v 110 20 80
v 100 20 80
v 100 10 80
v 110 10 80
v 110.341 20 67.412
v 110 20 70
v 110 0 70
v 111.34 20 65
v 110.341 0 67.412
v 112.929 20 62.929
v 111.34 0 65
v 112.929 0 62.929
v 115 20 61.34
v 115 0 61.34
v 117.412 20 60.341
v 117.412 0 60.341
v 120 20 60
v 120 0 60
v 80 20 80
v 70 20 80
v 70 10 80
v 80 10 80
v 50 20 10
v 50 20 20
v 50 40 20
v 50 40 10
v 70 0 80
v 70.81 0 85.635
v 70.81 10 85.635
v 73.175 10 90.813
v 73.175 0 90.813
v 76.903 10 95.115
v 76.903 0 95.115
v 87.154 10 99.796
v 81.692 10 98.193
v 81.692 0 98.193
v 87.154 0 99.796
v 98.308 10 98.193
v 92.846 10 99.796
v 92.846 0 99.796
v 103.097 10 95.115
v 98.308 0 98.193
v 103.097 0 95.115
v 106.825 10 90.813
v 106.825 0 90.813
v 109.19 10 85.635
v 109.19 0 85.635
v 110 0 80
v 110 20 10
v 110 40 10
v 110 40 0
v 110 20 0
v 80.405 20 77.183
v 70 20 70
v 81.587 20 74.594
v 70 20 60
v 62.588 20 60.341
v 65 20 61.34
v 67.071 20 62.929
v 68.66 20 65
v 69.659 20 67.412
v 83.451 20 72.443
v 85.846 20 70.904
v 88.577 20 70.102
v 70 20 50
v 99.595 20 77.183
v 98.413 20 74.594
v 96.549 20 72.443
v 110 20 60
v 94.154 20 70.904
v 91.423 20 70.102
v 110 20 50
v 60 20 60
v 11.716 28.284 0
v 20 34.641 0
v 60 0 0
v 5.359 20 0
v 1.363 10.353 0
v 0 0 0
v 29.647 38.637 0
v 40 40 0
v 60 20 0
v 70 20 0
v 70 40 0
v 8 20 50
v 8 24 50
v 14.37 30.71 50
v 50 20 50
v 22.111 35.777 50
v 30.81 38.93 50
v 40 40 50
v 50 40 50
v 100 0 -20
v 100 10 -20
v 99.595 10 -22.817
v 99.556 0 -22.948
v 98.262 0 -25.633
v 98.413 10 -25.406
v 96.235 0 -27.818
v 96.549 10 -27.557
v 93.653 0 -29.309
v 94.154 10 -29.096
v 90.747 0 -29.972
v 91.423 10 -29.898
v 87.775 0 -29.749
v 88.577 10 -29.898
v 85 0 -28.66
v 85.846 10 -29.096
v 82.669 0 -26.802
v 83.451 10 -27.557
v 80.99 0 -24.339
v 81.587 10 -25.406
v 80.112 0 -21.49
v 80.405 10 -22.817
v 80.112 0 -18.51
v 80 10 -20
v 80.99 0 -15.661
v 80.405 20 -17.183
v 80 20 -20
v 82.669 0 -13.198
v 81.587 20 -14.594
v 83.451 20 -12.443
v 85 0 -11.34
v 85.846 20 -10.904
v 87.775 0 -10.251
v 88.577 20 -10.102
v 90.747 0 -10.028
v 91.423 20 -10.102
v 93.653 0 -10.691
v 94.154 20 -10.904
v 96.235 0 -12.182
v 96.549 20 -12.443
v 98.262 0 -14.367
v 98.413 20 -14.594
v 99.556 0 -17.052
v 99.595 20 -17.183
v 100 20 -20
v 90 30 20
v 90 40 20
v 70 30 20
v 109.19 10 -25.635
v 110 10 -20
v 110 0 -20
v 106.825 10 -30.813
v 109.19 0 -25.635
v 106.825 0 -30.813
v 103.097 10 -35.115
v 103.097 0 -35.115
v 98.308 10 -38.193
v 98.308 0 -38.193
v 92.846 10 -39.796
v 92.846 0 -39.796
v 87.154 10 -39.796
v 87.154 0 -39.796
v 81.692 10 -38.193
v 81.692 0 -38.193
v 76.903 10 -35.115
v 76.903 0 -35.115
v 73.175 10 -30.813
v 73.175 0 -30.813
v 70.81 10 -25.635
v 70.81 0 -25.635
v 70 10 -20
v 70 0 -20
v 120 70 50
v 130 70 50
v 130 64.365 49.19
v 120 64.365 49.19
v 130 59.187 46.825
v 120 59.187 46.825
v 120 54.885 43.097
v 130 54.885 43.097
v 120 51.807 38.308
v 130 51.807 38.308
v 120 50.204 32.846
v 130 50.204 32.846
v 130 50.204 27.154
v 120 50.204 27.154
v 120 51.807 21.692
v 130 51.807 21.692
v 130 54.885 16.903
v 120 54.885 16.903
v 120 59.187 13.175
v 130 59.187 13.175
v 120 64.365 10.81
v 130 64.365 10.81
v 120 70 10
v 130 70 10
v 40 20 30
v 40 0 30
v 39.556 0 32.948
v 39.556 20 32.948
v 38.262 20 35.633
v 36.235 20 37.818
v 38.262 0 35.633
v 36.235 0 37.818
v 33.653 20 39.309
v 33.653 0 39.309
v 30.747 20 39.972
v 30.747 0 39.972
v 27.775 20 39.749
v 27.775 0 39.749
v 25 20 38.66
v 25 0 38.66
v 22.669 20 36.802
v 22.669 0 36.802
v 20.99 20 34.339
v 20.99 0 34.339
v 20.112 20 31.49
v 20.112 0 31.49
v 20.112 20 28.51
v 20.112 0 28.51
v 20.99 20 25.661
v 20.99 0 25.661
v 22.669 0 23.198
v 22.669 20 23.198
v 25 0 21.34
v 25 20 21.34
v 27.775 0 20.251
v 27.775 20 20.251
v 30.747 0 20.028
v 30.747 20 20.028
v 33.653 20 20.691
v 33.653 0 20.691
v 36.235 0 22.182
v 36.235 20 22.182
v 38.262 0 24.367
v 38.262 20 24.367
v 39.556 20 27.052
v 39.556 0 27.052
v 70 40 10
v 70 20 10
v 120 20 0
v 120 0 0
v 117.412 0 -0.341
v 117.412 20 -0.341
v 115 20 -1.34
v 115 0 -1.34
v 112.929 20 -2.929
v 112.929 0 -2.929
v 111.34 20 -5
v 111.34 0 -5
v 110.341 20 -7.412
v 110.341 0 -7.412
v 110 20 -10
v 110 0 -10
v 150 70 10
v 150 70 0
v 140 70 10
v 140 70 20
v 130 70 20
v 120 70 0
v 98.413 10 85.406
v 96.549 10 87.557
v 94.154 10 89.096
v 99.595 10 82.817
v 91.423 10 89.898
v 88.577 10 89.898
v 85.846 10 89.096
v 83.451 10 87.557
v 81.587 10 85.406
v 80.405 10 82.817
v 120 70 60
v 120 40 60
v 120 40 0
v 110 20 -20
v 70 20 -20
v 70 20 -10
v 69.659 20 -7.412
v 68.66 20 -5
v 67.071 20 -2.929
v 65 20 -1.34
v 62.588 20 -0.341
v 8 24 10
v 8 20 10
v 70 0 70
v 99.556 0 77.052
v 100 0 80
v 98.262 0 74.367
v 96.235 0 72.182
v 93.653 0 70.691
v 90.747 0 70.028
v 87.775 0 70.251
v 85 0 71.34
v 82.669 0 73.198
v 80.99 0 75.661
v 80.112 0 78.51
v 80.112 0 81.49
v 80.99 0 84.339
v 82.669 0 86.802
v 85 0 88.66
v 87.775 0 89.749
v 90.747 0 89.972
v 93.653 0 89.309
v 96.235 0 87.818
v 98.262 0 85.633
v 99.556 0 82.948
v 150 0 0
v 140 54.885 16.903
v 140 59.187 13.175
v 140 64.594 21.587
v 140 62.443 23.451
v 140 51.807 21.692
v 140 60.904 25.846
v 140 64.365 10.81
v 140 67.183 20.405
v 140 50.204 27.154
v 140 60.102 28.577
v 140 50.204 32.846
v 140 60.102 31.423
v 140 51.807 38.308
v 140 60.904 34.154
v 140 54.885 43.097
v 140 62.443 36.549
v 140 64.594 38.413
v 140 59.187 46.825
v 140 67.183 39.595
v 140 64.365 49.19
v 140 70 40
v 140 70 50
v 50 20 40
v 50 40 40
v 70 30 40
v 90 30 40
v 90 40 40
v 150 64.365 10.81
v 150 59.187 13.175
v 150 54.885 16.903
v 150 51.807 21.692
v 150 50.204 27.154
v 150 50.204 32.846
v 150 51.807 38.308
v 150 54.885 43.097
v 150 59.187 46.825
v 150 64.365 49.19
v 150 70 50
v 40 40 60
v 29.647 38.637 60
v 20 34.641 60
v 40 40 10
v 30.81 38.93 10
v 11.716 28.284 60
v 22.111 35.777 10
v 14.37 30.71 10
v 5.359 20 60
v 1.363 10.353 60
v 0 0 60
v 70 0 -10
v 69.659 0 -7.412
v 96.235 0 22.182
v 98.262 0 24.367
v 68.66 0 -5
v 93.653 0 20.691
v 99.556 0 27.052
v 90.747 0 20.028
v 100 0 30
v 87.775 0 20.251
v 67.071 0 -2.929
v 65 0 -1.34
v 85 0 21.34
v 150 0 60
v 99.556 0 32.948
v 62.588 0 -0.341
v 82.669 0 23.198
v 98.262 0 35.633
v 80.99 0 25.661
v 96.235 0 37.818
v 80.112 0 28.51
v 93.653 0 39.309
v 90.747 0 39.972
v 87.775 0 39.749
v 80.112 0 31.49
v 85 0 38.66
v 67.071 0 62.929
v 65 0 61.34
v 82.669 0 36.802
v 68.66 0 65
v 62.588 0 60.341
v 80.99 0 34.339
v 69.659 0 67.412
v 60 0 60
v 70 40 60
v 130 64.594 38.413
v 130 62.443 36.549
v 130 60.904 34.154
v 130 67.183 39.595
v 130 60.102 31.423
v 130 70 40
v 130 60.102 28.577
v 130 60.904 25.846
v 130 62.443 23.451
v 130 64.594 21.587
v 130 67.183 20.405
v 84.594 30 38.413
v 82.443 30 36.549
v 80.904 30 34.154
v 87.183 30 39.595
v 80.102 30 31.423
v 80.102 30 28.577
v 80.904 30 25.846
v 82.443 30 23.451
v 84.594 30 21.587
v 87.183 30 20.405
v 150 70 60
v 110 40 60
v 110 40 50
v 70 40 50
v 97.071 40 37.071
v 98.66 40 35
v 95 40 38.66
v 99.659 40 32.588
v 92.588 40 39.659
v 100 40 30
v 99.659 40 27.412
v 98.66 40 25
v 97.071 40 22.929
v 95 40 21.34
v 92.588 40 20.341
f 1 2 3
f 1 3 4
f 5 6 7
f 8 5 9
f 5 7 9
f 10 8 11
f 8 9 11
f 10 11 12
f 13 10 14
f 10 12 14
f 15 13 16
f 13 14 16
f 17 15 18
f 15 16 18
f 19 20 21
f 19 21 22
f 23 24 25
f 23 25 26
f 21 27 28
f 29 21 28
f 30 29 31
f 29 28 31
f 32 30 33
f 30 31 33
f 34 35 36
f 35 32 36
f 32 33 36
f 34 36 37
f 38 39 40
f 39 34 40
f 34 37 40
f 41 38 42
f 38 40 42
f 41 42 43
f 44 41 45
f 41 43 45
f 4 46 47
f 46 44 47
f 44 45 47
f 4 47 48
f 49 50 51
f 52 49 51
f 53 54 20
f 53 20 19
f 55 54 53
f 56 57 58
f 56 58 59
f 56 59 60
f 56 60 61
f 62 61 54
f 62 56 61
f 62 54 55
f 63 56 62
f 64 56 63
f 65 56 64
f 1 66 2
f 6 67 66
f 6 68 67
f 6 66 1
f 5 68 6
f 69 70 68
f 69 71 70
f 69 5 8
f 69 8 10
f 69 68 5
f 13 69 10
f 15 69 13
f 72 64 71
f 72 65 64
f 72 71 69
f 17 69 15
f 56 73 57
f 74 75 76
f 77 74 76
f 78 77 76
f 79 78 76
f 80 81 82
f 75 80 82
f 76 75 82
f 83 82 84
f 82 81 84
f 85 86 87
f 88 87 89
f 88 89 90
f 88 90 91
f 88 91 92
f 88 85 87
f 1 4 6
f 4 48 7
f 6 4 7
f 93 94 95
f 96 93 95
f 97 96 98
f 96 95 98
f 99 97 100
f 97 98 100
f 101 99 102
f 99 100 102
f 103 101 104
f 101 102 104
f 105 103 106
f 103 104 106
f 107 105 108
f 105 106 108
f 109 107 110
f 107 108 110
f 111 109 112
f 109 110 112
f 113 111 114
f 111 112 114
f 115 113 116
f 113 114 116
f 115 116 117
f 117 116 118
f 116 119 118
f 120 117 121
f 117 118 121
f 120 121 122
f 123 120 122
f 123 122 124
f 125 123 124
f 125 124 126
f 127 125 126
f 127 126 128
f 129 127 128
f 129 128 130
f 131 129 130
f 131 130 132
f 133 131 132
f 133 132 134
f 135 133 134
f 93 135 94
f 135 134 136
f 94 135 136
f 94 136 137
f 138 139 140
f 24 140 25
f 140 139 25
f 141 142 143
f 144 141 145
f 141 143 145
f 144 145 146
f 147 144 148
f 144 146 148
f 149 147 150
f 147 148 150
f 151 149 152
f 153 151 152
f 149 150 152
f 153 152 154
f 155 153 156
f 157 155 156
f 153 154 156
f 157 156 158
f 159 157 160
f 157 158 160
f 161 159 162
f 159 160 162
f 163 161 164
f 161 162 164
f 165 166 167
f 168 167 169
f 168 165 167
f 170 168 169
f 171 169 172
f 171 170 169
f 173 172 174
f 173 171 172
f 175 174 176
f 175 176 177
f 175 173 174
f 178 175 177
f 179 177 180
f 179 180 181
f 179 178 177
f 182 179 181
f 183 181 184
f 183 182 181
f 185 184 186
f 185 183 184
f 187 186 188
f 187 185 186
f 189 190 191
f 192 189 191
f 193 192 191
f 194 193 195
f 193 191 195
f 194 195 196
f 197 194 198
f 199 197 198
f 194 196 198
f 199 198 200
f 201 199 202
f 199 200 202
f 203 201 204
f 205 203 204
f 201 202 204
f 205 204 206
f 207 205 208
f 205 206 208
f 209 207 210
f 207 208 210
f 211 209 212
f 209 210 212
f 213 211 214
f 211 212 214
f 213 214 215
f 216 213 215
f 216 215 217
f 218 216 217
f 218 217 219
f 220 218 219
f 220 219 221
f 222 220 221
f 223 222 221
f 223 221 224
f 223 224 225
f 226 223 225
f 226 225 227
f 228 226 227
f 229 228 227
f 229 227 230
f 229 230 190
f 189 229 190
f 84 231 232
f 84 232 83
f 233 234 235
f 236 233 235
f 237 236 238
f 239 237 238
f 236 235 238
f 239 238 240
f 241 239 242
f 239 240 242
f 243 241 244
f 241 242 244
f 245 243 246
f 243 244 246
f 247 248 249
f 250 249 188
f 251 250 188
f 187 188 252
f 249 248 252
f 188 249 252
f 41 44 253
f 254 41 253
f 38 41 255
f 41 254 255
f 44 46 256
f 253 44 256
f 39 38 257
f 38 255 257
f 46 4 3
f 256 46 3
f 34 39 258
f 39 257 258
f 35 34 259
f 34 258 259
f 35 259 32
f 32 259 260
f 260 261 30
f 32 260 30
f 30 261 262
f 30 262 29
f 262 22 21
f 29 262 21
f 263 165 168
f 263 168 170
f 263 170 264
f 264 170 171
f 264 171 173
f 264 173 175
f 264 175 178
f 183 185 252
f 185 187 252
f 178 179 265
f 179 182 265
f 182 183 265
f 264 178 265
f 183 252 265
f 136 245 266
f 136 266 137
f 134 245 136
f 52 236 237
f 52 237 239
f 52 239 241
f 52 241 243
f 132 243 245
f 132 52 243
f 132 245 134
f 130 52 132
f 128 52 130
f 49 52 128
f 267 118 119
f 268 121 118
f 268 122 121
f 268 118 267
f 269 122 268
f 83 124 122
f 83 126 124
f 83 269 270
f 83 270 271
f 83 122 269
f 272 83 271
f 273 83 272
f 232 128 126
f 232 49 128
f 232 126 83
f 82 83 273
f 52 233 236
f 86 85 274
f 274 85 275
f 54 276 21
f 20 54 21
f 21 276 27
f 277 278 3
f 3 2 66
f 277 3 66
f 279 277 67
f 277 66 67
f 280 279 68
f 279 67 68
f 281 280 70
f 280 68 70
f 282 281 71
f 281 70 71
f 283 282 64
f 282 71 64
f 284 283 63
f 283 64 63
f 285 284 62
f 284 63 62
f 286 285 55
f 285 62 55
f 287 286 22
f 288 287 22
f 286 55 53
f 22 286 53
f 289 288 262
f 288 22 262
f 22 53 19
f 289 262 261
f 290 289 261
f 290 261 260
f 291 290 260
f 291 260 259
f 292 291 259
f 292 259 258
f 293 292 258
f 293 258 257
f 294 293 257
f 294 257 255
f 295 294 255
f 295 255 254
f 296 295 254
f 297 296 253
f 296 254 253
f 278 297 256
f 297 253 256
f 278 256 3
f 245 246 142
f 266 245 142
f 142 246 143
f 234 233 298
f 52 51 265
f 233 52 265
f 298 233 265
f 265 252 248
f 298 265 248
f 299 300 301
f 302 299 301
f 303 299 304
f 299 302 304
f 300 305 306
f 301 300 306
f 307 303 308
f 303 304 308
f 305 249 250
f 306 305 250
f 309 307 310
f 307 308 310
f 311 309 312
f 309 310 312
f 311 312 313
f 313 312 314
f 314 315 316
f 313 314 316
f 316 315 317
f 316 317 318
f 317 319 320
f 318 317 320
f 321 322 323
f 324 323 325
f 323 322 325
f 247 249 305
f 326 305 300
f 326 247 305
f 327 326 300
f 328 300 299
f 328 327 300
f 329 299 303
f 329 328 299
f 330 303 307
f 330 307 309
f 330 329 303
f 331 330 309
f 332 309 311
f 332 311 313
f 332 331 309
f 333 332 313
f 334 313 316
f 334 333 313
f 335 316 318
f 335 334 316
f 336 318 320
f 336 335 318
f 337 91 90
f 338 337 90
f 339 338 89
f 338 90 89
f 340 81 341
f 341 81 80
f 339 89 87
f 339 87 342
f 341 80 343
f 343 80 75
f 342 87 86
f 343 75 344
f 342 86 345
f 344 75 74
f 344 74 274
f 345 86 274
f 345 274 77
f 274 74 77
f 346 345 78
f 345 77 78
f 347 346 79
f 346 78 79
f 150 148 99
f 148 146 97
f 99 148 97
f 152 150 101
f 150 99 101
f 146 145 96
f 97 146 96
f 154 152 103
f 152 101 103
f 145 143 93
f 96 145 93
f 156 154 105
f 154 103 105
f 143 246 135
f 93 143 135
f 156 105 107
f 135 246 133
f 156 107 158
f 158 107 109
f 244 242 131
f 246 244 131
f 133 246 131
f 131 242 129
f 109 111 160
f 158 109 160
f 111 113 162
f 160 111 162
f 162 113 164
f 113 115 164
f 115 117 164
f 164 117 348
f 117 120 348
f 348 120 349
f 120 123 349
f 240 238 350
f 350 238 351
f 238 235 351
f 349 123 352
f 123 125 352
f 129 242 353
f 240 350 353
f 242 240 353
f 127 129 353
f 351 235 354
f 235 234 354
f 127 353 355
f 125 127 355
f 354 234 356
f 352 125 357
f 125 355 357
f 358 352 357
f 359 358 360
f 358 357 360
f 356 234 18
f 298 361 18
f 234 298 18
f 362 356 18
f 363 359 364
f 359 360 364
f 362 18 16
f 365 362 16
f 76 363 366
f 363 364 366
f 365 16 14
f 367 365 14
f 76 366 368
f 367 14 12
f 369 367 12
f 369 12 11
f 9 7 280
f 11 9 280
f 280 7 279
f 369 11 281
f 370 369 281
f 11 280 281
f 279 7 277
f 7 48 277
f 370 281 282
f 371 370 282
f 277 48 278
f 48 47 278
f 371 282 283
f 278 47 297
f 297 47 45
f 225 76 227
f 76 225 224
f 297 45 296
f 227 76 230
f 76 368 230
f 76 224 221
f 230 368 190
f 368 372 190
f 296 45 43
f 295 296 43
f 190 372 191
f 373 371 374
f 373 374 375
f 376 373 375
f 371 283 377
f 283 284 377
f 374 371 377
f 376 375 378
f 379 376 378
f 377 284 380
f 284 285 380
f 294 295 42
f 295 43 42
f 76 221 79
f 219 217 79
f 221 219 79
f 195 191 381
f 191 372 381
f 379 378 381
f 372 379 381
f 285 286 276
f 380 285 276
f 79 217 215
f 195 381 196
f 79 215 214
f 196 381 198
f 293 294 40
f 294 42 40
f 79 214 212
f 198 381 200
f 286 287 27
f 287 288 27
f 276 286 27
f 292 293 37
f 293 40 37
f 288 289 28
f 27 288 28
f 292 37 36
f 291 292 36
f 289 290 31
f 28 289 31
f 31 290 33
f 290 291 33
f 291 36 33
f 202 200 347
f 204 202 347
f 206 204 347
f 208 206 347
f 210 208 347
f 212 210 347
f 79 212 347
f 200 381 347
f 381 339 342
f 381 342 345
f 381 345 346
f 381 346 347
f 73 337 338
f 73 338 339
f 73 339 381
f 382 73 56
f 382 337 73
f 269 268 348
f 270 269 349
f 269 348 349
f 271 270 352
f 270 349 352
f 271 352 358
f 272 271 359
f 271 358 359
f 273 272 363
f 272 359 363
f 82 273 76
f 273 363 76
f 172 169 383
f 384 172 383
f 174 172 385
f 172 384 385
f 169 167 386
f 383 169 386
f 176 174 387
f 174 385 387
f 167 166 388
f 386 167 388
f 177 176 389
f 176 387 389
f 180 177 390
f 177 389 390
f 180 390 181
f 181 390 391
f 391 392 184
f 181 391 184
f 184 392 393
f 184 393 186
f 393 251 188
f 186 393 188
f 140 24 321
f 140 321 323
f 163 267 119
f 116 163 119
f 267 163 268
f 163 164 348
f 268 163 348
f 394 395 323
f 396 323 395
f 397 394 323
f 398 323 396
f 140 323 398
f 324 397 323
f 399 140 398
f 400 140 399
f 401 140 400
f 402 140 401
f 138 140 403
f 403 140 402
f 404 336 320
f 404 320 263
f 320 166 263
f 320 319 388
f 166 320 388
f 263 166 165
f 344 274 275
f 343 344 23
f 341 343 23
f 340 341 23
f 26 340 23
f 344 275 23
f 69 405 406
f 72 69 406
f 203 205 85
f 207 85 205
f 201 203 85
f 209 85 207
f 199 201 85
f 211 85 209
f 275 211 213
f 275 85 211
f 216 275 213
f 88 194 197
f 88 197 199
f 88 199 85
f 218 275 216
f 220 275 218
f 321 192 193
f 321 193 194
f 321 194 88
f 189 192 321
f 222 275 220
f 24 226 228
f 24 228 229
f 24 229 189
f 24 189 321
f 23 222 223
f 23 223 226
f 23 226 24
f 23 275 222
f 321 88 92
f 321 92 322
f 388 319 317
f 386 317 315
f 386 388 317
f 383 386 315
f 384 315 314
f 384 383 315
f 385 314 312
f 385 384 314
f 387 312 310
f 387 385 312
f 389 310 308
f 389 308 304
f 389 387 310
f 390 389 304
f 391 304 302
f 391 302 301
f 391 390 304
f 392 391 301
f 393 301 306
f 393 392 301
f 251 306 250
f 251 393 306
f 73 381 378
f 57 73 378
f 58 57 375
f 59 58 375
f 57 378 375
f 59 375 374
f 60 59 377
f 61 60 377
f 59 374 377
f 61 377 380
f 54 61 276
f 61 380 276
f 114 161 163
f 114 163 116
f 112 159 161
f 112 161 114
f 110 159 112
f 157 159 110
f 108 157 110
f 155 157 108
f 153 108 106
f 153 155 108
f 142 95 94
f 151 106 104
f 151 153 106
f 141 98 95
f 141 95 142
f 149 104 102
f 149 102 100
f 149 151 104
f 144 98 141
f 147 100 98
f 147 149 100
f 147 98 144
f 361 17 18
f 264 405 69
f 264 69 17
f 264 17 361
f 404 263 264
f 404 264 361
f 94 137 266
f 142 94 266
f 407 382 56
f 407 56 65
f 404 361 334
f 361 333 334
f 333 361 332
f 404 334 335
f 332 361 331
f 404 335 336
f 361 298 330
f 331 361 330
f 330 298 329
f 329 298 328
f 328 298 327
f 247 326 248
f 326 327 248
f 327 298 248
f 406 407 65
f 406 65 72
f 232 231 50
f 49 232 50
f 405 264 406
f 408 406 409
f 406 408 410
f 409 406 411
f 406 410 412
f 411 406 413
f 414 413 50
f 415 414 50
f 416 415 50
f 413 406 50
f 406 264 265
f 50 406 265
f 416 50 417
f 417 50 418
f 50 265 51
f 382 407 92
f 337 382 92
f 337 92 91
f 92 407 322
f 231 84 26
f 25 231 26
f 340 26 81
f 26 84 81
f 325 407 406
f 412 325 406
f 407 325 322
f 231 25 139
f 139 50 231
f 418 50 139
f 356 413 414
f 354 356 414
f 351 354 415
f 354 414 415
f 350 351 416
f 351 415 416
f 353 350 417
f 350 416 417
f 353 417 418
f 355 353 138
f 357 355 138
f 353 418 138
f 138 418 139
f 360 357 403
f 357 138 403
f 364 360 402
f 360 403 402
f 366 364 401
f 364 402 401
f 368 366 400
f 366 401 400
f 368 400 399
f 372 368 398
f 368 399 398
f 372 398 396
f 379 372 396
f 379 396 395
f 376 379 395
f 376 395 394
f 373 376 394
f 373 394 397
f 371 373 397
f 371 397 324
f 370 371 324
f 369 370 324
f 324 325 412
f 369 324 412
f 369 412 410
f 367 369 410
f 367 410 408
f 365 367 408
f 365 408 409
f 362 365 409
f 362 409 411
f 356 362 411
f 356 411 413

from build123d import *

# Parameters (mm, degrees)
BOSS_EXTRUDE1_DEPTH = 60
CUT_EXTRUDE1_DEPTH  = 10
CUT_EXTRUDE2_DEPTH  = 10
CUT_EXTRUDE3_DEPTH  = 30
SKETCH7_R           = 10
CUT_EXTRUDE5_DEPTH  = 75
SKETCH8_R           = 10
CUT_EXTRUDE6_DEPTH  = 75
SKETCH9_W           = 42
SKETCH9_H           = 40
CUT_EXTRUDE8_DEPTH  = 65
CUT_EXTRUDE9_DEPTH  = 10
CUT_EXTRUDE10_DEPTH = 20
SKETCH12_W          = 40
SKETCH12_H          = 10
CUT_EXTRUDE11_DEPTH = 20
BOSS_EXTRUDE2_DEPTH = 20
SKETCH14_R          = 10
CUT_EXTRUDE14_DEPTH = 20
CUT_EXTRUDE15_DEPTH = 10
BOSS_EXTRUDE3_DEPTH = 20
SKETCH18_R          = 10
CUT_EXTRUDE16_DEPTH = 20
CUT_EXTRUDE17_DEPTH = 10


with BuildPart() as part:
    # Sketch2 → Boss-Extrude1 (new body)
    with BuildSketch(Plane.XY):
        with BuildLine():
            Line((0, 0), (150, 0))
            Line((150, 0), (150, 70))
            Line((150, 70), (120, 70))
            Line((120, 70), (120, 40))
            Line((120, 40), (40, 40))
            ThreePointArc((40, 40), (11.715728753, 28.284271247), (0, 0))
        make_face()
    extrude(amount=BOSS_EXTRUDE1_DEPTH)

    # Sketch4 → Cut-Extrude1 (cut)
    with BuildSketch(Plane(origin=(150, 0, 0), x_dir=(0, 0, -1), z_dir=(1, 0, 0))):
        with BuildLine():
            Line((-50, 70), (-40, 70))
            ThreePointArc((-40, 70), (-30, 60), (-20, 70))
            Line((-20, 70), (-10, 70))
            ThreePointArc((-10, 70), (-30, 50), (-50, 70))
        make_face()
    extrude(amount=-CUT_EXTRUDE1_DEPTH, mode=Mode.SUBTRACT)

    # Sketch5 → Cut-Extrude2 (cut)
    with BuildSketch(Plane.ZY.offset(-120)):
        with BuildLine():
            Line((10, 70), (20, 70))
            ThreePointArc((20, 70), (30, 60), (40, 70))
            Line((40, 70), (50, 70))
            ThreePointArc((50, 70), (30, 50), (10, 70))
        make_face()
    extrude(amount=-CUT_EXTRUDE2_DEPTH, mode=Mode.SUBTRACT)

    # Sketch6 → Cut-Extrude3 (cut)
    with BuildSketch(Plane.ZY.offset(-120)):
        with BuildLine():
            Line((20, 70), (40, 70))
            ThreePointArc((40, 70), (30, 60), (20, 70))
        make_face()
    extrude(amount=-CUT_EXTRUDE3_DEPTH, mode=Mode.SUBTRACT)

    # Sketch7 → Cut-Extrude5 (cut)
    with BuildSketch(Plane(origin=(0, 40, 0), x_dir=(1, 0, 0), z_dir=(0, 1, 0))):
        with Locations((90, -30)):
            Circle(SKETCH7_R)
    extrude(amount=-CUT_EXTRUDE5_DEPTH, mode=Mode.SUBTRACT)

    # Sketch8 → Cut-Extrude6 (cut)
    with BuildSketch(Plane.XZ):
        with Locations((30, 30)):
            Circle(SKETCH8_R)
    extrude(amount=-CUT_EXTRUDE6_DEPTH, mode=Mode.SUBTRACT)

    # Sketch9 → Cut-Extrude8 (cut)
    with BuildSketch(Plane(origin=(0, 20, 0), x_dir=(1, 0, 0), z_dir=(0, 1, 0))):
        with Locations((29, -30)):
            Rectangle(SKETCH9_W, SKETCH9_H)
    extrude(amount=CUT_EXTRUDE8_DEPTH, mode=Mode.SUBTRACT)

    # Sketch10 → Cut-Extrude9 (cut)
    with BuildSketch(Plane(origin=(0, 40, 0), x_dir=(1, 0, 0), z_dir=(0, 1, 0))):
        with BuildLine():
            Line((90, -20), (50, -20))
            Line((50, -20), (50, -40))
            Line((50, -40), (90, -40))
            ThreePointArc((90, -40), (80, -30), (90, -20))
        make_face()
    extrude(amount=-CUT_EXTRUDE9_DEPTH, mode=Mode.SUBTRACT)

    # Sketch11 → Cut-Extrude10 (cut)
    with BuildSketch(Plane.XY.offset(20)):
        Polygon((50, 20), (70, 30), (50, 30), align=None)
    extrude(amount=CUT_EXTRUDE10_DEPTH, mode=Mode.SUBTRACT)

    # Sketch12 → Cut-Extrude11 (cut)
    with BuildSketch(Plane(origin=(0, 40, 0), x_dir=(1, 0, 0), z_dir=(0, 1, 0))):
        with Locations((90, -55)):
            Rectangle(SKETCH12_W, SKETCH12_H)
        with Locations((90, -5)):
            Rectangle(SKETCH12_W, SKETCH12_H)
    extrude(amount=-CUT_EXTRUDE11_DEPTH, mode=Mode.SUBTRACT)

    # Sketch13 → Boss-Extrude2 (add)
    with BuildSketch(Plane(origin=(0, 0, 0), x_dir=(1, 0, 0), z_dir=(0, 1, 0))):
        with BuildLine():
            Line((70, -70), (70, -80))
            ThreePointArc((70, -80), (90, -100), (110, -80))
            Line((110, -80), (110, -70))
            ThreePointArc((110, -70), (112.928932188, -62.928932188), (120, -60))
            Line((120, -60), (60, -60))
            ThreePointArc((60, -60), (67.071067812, -62.928932188), (70, -70))
        make_face()
    extrude(amount=BOSS_EXTRUDE2_DEPTH)

    # Sketch14 → Cut-Extrude14 (cut)
    with BuildSketch(Plane(origin=(0, 20, 0), x_dir=(1, 0, 0), z_dir=(0, 1, 0))):
        with Locations((90, -80)):
            Circle(SKETCH14_R)
    extrude(amount=-CUT_EXTRUDE14_DEPTH, mode=Mode.SUBTRACT)

    # Sketch15 → Cut-Extrude15 (cut)
    with BuildSketch(Plane(origin=(0, 20, 0), x_dir=(1, 0, 0), z_dir=(0, 1, 0))):
        with BuildLine():
            Line((70, -80), (80, -80))
            ThreePointArc((80, -80), (90, -90), (100, -80))
            Line((100, -80), (110, -80))
            ThreePointArc((110, -80), (90, -100), (70, -80))
        make_face()
    extrude(amount=-CUT_EXTRUDE15_DEPTH, mode=Mode.SUBTRACT)

    # Sketch17 → Boss-Extrude3 (add)
    with BuildSketch(Plane.XZ):
        with BuildLine():
            Line((110, -10), (110, -20))
            ThreePointArc((110, -20), (90, -40), (70, -20))
            Line((70, -20), (70, -10))
            ThreePointArc((70, -10), (67.071067812, -2.928932188), (60, 0))
            Line((60, 0), (120, 0))
            ThreePointArc((120, 0), (112.928932188, -2.928932188), (110, -10))
        make_face()
    extrude(amount=-BOSS_EXTRUDE3_DEPTH)

    # Sketch18 → Cut-Extrude16 (cut)
    with BuildSketch(Plane(origin=(0, 20, 0), x_dir=(1, 0, 0), z_dir=(0, 1, 0))):
        with Locations((90, 20)):
            Circle(SKETCH18_R)
    extrude(amount=-CUT_EXTRUDE16_DEPTH, mode=Mode.SUBTRACT)

    # Sketch19 → Cut-Extrude17 (cut)
    with BuildSketch(Plane(origin=(0, 20, 0), x_dir=(1, 0, 0), z_dir=(0, 1, 0))):
        with BuildLine():
            Line((100, 20), (110, 20))
            ThreePointArc((110, 20), (90, 40), (70, 20))
            Line((70, 20), (80, 20))
            ThreePointArc((80, 20), (90, 30), (100, 20))
        make_face()
    extrude(amount=-CUT_EXTRUDE17_DEPTH, mode=Mode.SUBTRACT)


solid = part.part
